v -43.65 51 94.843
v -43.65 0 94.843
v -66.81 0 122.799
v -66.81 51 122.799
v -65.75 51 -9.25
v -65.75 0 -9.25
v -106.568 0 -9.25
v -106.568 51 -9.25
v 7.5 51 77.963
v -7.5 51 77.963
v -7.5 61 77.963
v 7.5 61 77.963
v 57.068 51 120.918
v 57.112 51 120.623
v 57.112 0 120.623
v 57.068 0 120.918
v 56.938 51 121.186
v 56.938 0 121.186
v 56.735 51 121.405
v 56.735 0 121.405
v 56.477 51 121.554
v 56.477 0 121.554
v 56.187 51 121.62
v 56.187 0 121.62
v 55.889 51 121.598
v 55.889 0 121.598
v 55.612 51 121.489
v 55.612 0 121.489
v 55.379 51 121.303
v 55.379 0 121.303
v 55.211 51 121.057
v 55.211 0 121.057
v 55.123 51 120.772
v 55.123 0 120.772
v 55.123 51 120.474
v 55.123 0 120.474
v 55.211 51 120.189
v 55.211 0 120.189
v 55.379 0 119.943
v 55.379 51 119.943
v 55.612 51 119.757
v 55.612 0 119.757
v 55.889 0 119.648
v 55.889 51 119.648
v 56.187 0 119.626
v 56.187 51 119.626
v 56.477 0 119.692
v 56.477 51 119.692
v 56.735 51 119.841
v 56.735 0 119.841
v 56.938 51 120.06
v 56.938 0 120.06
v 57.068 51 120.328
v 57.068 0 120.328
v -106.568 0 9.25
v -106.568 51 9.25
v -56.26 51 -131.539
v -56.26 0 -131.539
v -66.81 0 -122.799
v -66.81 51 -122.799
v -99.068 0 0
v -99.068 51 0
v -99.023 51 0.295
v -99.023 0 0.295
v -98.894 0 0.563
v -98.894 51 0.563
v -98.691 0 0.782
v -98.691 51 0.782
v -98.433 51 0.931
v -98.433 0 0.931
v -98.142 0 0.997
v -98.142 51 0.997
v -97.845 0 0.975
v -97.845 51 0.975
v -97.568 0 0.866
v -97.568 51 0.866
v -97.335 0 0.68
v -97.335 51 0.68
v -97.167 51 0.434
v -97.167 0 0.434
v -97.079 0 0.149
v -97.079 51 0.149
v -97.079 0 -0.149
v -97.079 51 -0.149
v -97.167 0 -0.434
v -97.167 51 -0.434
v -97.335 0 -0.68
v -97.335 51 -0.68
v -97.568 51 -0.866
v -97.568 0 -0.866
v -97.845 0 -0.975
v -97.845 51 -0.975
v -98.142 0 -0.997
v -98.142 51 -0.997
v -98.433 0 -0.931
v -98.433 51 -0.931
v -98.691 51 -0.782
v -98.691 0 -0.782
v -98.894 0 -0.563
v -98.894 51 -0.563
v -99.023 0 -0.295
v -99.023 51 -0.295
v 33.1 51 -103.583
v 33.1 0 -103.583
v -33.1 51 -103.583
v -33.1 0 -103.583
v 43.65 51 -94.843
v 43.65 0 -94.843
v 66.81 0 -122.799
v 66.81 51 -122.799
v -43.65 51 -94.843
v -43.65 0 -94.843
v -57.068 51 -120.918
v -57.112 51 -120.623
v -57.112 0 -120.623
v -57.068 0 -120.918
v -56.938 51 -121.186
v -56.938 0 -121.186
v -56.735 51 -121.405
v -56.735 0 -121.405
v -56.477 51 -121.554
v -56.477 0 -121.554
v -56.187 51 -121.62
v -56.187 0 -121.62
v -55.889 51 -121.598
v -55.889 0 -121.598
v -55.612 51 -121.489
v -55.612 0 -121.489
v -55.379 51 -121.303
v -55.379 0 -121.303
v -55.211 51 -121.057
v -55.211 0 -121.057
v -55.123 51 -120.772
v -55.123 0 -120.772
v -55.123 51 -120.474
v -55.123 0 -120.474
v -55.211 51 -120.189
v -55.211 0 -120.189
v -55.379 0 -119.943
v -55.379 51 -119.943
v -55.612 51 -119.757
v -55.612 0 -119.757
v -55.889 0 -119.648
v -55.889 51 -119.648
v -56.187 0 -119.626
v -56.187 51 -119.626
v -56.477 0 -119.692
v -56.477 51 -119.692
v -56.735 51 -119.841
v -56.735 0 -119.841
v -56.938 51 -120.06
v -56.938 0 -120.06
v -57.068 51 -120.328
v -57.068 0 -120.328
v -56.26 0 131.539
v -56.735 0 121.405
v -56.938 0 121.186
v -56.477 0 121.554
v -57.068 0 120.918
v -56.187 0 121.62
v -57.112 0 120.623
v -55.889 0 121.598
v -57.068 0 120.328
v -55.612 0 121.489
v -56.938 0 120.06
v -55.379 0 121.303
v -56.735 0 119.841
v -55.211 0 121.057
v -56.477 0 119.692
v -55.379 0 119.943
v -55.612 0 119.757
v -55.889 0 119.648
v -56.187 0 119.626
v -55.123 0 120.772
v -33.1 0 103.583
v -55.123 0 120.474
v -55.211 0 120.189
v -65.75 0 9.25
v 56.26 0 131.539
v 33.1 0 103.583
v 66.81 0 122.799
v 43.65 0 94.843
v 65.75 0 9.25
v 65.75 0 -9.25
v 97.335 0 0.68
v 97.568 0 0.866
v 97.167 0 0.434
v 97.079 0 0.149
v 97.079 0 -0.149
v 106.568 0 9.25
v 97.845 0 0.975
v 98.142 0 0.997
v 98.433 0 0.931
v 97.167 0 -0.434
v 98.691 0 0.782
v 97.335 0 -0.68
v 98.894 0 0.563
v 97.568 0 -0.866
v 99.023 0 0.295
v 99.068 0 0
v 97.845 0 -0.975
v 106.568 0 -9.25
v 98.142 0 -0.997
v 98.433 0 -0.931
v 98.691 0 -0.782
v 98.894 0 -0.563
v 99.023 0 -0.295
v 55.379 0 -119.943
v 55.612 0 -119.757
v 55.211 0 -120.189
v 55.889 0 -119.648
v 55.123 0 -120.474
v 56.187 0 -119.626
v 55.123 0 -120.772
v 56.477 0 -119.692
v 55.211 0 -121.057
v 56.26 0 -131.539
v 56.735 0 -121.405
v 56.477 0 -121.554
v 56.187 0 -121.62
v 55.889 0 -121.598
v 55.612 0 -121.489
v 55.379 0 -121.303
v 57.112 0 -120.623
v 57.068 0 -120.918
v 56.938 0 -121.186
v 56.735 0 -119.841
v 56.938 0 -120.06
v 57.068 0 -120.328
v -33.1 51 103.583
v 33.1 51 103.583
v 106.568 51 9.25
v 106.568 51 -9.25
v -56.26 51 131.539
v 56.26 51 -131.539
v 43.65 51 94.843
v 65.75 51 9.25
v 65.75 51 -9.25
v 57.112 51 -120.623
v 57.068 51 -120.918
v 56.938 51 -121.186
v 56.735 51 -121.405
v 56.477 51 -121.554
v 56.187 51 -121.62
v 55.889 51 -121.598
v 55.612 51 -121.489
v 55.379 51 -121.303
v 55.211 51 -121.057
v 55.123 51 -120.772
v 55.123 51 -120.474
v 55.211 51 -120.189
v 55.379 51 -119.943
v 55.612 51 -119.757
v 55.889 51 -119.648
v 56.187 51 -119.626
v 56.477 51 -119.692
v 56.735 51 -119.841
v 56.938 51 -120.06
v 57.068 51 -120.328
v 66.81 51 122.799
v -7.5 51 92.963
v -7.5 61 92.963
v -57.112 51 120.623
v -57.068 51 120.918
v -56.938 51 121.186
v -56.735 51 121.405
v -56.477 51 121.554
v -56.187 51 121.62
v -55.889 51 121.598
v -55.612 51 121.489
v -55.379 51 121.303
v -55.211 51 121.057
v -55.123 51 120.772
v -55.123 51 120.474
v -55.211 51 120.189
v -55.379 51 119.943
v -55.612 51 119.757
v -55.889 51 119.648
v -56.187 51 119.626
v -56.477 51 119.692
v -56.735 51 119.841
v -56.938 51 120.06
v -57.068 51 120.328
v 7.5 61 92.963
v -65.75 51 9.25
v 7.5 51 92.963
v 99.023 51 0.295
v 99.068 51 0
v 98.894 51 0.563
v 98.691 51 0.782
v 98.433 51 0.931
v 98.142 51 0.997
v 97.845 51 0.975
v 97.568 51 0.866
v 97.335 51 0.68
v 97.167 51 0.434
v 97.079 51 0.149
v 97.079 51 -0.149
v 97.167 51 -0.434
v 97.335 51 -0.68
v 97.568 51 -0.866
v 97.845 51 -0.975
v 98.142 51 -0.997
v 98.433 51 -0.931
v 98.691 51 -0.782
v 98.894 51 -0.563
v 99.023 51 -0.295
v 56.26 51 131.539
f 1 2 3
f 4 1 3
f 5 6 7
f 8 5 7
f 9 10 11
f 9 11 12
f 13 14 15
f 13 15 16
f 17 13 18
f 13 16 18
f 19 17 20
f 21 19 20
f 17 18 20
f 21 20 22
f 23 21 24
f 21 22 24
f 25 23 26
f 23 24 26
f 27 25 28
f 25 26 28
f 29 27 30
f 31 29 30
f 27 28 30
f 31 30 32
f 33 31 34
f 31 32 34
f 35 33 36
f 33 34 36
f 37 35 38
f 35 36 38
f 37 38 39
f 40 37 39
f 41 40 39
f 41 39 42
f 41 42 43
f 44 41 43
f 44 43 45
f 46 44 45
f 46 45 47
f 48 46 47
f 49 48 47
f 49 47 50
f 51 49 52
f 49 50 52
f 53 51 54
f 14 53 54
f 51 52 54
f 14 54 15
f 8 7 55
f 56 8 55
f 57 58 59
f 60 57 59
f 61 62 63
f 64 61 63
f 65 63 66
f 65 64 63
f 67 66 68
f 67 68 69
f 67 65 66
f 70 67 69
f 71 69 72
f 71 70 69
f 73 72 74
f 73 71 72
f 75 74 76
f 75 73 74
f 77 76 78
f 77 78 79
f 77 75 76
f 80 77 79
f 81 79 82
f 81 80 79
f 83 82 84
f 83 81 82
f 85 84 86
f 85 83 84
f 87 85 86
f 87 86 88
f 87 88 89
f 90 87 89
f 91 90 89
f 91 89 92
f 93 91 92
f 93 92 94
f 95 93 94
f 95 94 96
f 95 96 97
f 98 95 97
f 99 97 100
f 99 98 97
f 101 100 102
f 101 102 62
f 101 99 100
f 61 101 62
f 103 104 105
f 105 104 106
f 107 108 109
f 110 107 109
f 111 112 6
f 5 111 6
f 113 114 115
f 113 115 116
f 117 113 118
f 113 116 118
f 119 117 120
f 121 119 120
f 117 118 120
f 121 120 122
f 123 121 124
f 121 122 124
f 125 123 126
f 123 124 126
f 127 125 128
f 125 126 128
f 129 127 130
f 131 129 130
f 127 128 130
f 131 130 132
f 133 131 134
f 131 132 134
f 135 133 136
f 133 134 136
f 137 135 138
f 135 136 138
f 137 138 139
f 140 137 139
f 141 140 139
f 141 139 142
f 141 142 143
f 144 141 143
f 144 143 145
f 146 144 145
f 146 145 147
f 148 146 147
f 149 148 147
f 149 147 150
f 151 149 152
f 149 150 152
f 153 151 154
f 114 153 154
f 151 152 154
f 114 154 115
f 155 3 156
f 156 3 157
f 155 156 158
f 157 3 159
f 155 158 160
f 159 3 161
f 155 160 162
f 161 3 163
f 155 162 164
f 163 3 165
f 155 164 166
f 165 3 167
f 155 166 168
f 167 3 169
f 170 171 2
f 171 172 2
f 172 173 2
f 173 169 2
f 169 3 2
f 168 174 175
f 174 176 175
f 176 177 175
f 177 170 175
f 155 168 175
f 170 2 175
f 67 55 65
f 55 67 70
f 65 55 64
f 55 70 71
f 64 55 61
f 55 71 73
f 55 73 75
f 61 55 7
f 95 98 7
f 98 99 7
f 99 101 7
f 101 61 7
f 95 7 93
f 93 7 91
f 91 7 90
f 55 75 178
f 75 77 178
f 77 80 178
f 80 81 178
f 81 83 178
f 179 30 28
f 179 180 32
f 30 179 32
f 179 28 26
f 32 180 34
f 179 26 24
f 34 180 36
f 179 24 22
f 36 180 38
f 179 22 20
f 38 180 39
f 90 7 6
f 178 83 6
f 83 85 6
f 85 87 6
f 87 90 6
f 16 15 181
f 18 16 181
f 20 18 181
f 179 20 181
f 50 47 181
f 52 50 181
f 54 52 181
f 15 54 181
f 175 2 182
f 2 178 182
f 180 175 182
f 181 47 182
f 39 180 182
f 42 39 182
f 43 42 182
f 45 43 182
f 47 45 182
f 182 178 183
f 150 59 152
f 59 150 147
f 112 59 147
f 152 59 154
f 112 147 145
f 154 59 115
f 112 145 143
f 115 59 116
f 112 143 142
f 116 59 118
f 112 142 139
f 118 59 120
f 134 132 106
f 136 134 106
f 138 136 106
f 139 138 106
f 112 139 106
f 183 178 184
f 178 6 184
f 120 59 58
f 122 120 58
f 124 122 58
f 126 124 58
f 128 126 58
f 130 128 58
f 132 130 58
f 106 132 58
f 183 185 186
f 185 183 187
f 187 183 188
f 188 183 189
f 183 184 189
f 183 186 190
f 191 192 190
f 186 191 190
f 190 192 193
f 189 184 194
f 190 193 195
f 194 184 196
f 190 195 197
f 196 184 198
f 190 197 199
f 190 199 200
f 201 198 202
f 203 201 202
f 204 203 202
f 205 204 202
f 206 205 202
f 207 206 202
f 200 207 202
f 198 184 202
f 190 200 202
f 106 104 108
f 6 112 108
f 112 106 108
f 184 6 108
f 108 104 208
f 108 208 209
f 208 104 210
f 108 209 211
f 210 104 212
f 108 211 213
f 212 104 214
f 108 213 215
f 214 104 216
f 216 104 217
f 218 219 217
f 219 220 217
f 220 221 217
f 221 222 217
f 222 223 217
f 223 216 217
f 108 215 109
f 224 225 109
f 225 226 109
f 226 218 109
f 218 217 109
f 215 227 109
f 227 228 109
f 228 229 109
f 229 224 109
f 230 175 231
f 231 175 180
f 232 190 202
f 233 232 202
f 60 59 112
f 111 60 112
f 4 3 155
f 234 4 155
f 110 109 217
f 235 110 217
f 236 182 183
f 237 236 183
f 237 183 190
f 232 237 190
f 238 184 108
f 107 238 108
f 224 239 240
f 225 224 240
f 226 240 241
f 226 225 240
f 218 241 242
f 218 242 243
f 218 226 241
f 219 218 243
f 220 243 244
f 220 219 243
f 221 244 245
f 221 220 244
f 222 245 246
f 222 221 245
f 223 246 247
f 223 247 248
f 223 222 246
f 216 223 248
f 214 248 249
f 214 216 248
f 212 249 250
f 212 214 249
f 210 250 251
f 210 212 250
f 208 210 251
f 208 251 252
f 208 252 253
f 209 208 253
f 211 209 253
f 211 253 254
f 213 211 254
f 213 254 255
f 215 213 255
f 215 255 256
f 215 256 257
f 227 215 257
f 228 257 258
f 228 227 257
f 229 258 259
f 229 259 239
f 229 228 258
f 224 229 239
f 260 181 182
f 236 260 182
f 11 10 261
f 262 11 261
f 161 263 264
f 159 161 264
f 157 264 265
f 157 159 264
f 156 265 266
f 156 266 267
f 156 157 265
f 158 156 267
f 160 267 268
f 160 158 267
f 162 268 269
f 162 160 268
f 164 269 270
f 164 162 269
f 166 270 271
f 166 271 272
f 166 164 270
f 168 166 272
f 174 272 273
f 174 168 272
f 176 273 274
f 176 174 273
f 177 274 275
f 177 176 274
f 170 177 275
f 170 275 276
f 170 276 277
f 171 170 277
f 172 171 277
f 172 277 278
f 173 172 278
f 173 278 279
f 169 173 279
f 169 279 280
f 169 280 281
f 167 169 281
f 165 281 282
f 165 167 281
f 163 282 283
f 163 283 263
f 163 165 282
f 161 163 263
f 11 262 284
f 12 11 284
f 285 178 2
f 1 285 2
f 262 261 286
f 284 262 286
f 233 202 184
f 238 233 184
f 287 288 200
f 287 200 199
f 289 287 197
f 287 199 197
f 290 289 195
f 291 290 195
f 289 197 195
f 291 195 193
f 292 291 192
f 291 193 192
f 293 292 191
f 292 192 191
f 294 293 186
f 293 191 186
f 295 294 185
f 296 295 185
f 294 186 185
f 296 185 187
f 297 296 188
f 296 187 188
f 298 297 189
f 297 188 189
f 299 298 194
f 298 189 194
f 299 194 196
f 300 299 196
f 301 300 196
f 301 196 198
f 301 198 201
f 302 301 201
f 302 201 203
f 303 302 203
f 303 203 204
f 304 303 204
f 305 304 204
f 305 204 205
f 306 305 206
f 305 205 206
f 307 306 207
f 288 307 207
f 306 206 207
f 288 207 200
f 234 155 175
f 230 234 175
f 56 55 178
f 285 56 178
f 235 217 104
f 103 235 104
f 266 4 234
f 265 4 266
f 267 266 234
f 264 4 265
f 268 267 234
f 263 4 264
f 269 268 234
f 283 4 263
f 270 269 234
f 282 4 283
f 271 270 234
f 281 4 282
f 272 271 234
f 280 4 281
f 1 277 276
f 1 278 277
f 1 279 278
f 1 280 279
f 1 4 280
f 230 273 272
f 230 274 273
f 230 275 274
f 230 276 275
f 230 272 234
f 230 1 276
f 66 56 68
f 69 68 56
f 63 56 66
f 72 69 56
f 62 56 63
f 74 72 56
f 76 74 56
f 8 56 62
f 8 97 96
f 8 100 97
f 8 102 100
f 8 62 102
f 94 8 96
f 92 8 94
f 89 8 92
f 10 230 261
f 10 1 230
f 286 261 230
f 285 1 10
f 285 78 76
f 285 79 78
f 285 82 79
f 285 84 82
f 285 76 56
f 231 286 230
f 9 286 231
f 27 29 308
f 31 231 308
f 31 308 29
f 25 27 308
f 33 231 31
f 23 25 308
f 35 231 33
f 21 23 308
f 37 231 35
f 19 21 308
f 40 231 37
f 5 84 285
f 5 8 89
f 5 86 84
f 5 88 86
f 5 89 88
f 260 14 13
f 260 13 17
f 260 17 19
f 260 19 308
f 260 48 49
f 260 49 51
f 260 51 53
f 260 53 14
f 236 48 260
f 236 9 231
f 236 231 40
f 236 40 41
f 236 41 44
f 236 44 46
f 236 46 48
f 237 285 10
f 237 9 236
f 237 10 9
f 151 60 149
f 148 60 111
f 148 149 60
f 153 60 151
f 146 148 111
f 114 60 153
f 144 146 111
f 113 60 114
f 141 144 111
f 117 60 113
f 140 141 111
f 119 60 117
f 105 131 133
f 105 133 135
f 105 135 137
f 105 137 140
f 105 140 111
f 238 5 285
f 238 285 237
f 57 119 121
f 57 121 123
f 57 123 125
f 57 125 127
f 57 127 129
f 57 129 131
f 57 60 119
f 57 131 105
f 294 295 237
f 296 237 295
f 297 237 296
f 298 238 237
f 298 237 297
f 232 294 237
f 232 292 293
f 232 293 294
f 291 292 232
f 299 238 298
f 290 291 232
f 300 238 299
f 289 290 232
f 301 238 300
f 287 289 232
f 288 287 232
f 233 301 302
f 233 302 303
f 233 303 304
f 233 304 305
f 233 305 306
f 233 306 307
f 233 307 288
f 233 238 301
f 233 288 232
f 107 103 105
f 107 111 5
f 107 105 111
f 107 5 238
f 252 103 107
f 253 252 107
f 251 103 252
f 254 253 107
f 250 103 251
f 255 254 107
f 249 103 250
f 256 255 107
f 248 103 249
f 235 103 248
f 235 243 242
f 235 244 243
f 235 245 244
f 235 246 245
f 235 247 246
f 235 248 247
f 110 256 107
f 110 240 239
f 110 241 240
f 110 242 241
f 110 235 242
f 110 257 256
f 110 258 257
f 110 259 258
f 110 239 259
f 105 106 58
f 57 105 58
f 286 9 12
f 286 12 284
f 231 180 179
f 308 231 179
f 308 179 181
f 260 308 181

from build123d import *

# Parameters (mm, degrees)
EXTRUDE_1_DEPTH          = 51
SKETCH_2_R               = 1
CUT_EXTRUDE_1_DEPTH      = 51
SKETCH_3_R               = 1
CUT_EXTRUDE_2_DEPTH      = 51
MIRROR_3_COPY_1_SKETCH_R = 1
MIRROR_3_COPY_1_DEPTH    = 51
SKETCH_4_W               = 15
SKETCH_4_H               = 15
EXTRUDE_2_DEPTH          = 10


with BuildPart() as part:
    # 草图1 → 凸台-拉伸1 (new body)
    with BuildSketch(Plane(origin=(0, 0, 0), x_dir=(1, 0, 0), z_dir=(0, 1, 0))):
        Polygon((43.65, -94.842931951), (65.75, -9.25), (106.567585168, -9.25), (106.567585168, 9.25), (65.75, 9.25), (43.65, 94.842931951), (66.809562052, 122.798714511), (56.259562052, 131.538708791), (33.1, 103.58292623), (-33.1, 103.58292623), (-56.259562052, 131.538708791), (-66.809562052, 122.798714511), (-43.65, 94.842931951), (-65.75, 9.25), (-106.567585168, 9.25), (-106.567585168, -9.25), (-65.75, -9.25), (-43.65, -94.842931951), (-66.809562052, -122.798714511), (-56.259562052, -131.538708791), (-33.1, -103.58292623), (33.1, -103.58292623), (56.259562052, -131.538708791), (66.809562052, -122.798714511), align=None)
    extrude(amount=EXTRUDE_1_DEPTH)

    # 草图2 → 切除-拉伸1 (cut)
    with BuildSketch(Plane.XZ):
        with Locations((98.067585168, 0)):
            Circle(SKETCH_2_R)
    cut_extrude_1 = extrude(amount=-CUT_EXTRUDE_1_DEPTH, mode=Mode.SUBTRACT)

    # 镜向1: 切除-拉伸1 across plane
    add(cut_extrude_1.mirror(Plane(origin=(0, 0, 0), x_dir=(0, 0, 1), z_dir=(1, 0, 0))), mode=Mode.SUBTRACT)

    # 草图3 → 切除-拉伸2 (cut)
    with BuildSketch(Plane.XZ):
        with Locations((56.111937864, 120.623091213)):
            Circle(SKETCH_3_R)
    cut_extrude_2 = extrude(amount=-CUT_EXTRUDE_2_DEPTH, mode=Mode.SUBTRACT)

    # 镜向2: 切除-拉伸2 across plane
    add(cut_extrude_2.mirror(Plane(origin=(0, 0, 0), x_dir=(0, 0, 1), z_dir=(1, 0, 0))), mode=Mode.SUBTRACT)

    # 镜向3: 切除-拉伸2 across plane
    add(cut_extrude_2.mirror(Plane.XY), mode=Mode.SUBTRACT)

    # 镜向3 copy 1 sketch → 镜向3 copy 1 (cut)
    with BuildSketch(Plane(origin=(0, 0, 0), x_dir=(-1, 0, 0), z_dir=(0, -1, 0))):
        with Locations((56.111937864, 120.623091213)):
            Circle(MIRROR_3_COPY_1_SKETCH_R)
    extrude(amount=-MIRROR_3_COPY_1_DEPTH, mode=Mode.SUBTRACT)

    # 草图4 → 凸台-拉伸2 (add)
    with BuildSketch(Plane.XZ.offset(-51)):
        with Locations((0, 85.462689848)):
            Rectangle(SKETCH_4_W, SKETCH_4_H)
    extrude(amount=-EXTRUDE_2_DEPTH)


solid = part.part
